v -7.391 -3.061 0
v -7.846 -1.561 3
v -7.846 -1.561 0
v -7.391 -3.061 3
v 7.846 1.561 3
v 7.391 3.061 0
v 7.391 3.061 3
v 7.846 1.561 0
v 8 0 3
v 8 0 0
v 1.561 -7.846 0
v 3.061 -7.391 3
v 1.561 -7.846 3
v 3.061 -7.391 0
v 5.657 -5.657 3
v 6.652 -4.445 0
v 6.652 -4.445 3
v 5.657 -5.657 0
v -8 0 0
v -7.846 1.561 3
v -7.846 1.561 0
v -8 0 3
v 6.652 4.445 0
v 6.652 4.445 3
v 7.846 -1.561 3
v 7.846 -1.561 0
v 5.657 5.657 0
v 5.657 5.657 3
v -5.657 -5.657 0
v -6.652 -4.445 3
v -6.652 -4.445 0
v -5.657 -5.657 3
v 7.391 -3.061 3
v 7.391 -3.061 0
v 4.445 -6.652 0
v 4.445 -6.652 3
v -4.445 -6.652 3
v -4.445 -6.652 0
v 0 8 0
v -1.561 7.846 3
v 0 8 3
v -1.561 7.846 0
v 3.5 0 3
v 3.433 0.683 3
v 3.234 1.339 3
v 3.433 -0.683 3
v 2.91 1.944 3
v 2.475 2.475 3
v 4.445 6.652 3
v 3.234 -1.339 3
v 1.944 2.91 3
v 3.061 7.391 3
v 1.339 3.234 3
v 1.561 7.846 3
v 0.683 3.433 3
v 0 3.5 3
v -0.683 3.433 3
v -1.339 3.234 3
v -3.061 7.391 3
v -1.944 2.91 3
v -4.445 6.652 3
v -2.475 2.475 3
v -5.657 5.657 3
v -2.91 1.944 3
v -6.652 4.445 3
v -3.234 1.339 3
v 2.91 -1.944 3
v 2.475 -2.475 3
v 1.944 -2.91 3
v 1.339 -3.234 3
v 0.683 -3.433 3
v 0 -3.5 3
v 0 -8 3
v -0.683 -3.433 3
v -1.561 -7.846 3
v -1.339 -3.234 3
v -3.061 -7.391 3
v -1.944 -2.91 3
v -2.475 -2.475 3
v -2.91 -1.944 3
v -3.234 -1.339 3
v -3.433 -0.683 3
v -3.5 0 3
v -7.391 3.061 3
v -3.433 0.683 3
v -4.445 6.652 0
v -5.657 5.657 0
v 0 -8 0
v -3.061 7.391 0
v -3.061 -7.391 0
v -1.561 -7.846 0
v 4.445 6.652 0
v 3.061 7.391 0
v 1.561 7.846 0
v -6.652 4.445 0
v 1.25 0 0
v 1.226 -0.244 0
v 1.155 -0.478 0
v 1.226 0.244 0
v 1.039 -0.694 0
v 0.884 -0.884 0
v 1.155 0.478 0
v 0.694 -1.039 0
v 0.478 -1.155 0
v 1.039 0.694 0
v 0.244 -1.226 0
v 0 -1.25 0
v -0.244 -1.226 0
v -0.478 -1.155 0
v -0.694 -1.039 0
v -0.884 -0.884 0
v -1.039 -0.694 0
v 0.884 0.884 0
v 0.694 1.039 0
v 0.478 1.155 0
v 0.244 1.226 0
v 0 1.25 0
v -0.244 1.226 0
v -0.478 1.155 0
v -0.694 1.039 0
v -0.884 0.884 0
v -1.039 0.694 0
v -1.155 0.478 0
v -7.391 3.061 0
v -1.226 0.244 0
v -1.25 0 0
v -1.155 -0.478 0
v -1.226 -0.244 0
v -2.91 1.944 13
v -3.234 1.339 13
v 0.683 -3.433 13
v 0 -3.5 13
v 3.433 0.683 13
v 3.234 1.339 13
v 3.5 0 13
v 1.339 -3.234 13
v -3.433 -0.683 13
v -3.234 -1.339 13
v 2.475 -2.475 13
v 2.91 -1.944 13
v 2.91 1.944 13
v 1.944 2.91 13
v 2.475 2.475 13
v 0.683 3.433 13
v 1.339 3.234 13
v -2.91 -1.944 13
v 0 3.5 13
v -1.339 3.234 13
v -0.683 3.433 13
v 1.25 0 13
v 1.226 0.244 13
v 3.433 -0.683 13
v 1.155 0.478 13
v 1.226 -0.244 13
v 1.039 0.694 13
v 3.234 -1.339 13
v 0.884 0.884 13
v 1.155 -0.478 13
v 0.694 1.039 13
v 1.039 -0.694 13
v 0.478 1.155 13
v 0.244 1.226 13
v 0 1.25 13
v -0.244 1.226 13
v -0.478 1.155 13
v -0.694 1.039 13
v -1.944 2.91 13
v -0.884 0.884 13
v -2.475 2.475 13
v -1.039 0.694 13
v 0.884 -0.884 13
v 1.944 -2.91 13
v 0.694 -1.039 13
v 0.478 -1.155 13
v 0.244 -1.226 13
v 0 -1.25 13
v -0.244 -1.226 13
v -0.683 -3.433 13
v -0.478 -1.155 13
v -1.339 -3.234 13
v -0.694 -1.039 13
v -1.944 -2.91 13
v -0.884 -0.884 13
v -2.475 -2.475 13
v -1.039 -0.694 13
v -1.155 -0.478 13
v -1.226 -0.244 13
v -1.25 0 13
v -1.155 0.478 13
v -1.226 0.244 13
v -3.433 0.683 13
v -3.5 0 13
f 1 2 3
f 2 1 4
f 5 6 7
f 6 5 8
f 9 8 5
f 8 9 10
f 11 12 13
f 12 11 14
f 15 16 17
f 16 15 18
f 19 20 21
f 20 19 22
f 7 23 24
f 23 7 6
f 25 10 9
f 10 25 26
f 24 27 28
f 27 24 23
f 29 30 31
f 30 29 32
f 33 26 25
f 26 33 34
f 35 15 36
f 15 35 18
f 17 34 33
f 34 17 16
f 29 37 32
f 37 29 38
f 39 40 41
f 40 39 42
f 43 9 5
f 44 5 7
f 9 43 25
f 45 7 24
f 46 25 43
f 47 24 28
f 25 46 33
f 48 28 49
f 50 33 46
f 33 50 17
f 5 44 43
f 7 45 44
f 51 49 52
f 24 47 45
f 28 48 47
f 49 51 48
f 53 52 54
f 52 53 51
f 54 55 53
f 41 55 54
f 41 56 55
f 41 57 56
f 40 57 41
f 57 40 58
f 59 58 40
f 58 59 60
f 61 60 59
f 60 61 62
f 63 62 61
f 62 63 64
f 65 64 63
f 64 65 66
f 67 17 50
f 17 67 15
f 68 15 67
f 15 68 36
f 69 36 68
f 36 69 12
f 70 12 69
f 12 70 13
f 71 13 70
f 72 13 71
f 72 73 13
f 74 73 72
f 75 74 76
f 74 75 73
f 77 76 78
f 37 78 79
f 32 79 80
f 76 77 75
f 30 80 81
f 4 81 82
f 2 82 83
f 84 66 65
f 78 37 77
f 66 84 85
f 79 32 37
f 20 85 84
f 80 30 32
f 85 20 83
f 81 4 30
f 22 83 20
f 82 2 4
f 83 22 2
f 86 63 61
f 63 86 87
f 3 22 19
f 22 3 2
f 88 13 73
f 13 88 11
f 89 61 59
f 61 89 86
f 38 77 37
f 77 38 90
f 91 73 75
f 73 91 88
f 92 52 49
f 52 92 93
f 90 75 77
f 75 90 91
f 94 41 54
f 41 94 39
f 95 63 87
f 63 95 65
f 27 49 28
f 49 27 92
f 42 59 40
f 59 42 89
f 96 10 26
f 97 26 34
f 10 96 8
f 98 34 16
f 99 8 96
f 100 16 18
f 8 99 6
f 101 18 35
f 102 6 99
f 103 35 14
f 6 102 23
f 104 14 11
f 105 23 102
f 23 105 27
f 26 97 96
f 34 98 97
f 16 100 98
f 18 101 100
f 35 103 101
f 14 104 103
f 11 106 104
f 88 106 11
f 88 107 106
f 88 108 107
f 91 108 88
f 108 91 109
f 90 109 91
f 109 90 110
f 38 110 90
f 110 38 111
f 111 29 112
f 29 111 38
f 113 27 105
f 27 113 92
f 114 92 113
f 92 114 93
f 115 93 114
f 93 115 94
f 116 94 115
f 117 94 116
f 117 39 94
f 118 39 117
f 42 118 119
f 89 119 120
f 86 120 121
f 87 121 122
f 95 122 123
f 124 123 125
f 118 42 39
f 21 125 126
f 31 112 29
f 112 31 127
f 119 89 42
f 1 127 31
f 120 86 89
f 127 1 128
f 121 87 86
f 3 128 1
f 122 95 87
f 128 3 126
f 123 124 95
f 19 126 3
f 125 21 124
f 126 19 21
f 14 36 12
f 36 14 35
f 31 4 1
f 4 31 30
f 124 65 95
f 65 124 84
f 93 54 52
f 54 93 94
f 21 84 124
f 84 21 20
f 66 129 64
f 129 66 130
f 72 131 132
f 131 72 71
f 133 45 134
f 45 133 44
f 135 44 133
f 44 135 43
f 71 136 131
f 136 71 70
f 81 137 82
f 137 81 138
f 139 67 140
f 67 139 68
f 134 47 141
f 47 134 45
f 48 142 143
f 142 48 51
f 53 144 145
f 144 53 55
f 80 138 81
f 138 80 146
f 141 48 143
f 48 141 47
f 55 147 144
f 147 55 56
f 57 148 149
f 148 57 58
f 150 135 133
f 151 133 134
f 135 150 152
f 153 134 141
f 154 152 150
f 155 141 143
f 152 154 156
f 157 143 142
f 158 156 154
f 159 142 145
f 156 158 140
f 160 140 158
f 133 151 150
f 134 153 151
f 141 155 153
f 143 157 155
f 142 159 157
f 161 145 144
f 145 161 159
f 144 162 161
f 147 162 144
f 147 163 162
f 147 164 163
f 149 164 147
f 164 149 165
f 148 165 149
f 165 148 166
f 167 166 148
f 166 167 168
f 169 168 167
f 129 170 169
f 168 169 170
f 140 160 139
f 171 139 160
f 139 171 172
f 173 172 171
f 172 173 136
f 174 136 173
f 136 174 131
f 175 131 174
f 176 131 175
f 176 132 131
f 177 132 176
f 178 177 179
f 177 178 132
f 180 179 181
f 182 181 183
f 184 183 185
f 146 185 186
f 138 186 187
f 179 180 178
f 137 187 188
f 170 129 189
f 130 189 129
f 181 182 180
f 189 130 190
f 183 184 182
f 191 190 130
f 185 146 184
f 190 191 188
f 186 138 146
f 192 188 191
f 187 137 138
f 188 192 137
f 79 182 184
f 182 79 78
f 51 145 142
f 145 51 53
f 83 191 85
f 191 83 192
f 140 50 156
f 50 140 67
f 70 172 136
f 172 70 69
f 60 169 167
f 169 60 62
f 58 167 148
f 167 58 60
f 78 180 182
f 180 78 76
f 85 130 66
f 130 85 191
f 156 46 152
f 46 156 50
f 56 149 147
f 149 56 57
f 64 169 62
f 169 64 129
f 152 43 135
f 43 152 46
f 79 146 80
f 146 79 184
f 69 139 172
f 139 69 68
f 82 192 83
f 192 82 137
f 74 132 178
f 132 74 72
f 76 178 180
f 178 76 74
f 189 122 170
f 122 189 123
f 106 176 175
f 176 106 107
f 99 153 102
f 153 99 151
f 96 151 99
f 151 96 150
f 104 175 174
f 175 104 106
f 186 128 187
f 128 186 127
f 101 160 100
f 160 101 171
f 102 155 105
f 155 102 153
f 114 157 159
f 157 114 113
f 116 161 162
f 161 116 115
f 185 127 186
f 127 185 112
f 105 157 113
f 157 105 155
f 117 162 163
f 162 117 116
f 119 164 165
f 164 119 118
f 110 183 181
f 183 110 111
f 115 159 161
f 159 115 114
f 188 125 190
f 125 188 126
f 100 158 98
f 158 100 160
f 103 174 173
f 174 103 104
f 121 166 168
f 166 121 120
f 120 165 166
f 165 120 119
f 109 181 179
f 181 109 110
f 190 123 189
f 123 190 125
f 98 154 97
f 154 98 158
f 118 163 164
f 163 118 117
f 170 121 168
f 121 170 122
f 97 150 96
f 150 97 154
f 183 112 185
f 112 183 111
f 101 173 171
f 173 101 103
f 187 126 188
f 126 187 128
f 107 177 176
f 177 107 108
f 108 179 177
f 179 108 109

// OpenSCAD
$fn = 32;

// ----------------------------------------------------------------------
// Micro post: flanged post, 5-20 mm class
// ----------------------------------------------------------------------

// --- parameters (mm) ---
post_d = 7;               // post diameter
post_h = 10;              // post height above the flange
flange_d = 16;            // flange diameter
flange_t = 3;             // flange thickness
bore_d = 2.5;             // through bore

total_h = post_h + flange_t;  // overall height

difference() {
  union() {
    cylinder(h = flange_t, d = flange_d);
    translate([0, 0, flange_t]) cylinder(h = post_h, d = post_d);
  }
  translate([0, 0, -1]) cylinder(h = total_h + 2, d = bore_d);
}
